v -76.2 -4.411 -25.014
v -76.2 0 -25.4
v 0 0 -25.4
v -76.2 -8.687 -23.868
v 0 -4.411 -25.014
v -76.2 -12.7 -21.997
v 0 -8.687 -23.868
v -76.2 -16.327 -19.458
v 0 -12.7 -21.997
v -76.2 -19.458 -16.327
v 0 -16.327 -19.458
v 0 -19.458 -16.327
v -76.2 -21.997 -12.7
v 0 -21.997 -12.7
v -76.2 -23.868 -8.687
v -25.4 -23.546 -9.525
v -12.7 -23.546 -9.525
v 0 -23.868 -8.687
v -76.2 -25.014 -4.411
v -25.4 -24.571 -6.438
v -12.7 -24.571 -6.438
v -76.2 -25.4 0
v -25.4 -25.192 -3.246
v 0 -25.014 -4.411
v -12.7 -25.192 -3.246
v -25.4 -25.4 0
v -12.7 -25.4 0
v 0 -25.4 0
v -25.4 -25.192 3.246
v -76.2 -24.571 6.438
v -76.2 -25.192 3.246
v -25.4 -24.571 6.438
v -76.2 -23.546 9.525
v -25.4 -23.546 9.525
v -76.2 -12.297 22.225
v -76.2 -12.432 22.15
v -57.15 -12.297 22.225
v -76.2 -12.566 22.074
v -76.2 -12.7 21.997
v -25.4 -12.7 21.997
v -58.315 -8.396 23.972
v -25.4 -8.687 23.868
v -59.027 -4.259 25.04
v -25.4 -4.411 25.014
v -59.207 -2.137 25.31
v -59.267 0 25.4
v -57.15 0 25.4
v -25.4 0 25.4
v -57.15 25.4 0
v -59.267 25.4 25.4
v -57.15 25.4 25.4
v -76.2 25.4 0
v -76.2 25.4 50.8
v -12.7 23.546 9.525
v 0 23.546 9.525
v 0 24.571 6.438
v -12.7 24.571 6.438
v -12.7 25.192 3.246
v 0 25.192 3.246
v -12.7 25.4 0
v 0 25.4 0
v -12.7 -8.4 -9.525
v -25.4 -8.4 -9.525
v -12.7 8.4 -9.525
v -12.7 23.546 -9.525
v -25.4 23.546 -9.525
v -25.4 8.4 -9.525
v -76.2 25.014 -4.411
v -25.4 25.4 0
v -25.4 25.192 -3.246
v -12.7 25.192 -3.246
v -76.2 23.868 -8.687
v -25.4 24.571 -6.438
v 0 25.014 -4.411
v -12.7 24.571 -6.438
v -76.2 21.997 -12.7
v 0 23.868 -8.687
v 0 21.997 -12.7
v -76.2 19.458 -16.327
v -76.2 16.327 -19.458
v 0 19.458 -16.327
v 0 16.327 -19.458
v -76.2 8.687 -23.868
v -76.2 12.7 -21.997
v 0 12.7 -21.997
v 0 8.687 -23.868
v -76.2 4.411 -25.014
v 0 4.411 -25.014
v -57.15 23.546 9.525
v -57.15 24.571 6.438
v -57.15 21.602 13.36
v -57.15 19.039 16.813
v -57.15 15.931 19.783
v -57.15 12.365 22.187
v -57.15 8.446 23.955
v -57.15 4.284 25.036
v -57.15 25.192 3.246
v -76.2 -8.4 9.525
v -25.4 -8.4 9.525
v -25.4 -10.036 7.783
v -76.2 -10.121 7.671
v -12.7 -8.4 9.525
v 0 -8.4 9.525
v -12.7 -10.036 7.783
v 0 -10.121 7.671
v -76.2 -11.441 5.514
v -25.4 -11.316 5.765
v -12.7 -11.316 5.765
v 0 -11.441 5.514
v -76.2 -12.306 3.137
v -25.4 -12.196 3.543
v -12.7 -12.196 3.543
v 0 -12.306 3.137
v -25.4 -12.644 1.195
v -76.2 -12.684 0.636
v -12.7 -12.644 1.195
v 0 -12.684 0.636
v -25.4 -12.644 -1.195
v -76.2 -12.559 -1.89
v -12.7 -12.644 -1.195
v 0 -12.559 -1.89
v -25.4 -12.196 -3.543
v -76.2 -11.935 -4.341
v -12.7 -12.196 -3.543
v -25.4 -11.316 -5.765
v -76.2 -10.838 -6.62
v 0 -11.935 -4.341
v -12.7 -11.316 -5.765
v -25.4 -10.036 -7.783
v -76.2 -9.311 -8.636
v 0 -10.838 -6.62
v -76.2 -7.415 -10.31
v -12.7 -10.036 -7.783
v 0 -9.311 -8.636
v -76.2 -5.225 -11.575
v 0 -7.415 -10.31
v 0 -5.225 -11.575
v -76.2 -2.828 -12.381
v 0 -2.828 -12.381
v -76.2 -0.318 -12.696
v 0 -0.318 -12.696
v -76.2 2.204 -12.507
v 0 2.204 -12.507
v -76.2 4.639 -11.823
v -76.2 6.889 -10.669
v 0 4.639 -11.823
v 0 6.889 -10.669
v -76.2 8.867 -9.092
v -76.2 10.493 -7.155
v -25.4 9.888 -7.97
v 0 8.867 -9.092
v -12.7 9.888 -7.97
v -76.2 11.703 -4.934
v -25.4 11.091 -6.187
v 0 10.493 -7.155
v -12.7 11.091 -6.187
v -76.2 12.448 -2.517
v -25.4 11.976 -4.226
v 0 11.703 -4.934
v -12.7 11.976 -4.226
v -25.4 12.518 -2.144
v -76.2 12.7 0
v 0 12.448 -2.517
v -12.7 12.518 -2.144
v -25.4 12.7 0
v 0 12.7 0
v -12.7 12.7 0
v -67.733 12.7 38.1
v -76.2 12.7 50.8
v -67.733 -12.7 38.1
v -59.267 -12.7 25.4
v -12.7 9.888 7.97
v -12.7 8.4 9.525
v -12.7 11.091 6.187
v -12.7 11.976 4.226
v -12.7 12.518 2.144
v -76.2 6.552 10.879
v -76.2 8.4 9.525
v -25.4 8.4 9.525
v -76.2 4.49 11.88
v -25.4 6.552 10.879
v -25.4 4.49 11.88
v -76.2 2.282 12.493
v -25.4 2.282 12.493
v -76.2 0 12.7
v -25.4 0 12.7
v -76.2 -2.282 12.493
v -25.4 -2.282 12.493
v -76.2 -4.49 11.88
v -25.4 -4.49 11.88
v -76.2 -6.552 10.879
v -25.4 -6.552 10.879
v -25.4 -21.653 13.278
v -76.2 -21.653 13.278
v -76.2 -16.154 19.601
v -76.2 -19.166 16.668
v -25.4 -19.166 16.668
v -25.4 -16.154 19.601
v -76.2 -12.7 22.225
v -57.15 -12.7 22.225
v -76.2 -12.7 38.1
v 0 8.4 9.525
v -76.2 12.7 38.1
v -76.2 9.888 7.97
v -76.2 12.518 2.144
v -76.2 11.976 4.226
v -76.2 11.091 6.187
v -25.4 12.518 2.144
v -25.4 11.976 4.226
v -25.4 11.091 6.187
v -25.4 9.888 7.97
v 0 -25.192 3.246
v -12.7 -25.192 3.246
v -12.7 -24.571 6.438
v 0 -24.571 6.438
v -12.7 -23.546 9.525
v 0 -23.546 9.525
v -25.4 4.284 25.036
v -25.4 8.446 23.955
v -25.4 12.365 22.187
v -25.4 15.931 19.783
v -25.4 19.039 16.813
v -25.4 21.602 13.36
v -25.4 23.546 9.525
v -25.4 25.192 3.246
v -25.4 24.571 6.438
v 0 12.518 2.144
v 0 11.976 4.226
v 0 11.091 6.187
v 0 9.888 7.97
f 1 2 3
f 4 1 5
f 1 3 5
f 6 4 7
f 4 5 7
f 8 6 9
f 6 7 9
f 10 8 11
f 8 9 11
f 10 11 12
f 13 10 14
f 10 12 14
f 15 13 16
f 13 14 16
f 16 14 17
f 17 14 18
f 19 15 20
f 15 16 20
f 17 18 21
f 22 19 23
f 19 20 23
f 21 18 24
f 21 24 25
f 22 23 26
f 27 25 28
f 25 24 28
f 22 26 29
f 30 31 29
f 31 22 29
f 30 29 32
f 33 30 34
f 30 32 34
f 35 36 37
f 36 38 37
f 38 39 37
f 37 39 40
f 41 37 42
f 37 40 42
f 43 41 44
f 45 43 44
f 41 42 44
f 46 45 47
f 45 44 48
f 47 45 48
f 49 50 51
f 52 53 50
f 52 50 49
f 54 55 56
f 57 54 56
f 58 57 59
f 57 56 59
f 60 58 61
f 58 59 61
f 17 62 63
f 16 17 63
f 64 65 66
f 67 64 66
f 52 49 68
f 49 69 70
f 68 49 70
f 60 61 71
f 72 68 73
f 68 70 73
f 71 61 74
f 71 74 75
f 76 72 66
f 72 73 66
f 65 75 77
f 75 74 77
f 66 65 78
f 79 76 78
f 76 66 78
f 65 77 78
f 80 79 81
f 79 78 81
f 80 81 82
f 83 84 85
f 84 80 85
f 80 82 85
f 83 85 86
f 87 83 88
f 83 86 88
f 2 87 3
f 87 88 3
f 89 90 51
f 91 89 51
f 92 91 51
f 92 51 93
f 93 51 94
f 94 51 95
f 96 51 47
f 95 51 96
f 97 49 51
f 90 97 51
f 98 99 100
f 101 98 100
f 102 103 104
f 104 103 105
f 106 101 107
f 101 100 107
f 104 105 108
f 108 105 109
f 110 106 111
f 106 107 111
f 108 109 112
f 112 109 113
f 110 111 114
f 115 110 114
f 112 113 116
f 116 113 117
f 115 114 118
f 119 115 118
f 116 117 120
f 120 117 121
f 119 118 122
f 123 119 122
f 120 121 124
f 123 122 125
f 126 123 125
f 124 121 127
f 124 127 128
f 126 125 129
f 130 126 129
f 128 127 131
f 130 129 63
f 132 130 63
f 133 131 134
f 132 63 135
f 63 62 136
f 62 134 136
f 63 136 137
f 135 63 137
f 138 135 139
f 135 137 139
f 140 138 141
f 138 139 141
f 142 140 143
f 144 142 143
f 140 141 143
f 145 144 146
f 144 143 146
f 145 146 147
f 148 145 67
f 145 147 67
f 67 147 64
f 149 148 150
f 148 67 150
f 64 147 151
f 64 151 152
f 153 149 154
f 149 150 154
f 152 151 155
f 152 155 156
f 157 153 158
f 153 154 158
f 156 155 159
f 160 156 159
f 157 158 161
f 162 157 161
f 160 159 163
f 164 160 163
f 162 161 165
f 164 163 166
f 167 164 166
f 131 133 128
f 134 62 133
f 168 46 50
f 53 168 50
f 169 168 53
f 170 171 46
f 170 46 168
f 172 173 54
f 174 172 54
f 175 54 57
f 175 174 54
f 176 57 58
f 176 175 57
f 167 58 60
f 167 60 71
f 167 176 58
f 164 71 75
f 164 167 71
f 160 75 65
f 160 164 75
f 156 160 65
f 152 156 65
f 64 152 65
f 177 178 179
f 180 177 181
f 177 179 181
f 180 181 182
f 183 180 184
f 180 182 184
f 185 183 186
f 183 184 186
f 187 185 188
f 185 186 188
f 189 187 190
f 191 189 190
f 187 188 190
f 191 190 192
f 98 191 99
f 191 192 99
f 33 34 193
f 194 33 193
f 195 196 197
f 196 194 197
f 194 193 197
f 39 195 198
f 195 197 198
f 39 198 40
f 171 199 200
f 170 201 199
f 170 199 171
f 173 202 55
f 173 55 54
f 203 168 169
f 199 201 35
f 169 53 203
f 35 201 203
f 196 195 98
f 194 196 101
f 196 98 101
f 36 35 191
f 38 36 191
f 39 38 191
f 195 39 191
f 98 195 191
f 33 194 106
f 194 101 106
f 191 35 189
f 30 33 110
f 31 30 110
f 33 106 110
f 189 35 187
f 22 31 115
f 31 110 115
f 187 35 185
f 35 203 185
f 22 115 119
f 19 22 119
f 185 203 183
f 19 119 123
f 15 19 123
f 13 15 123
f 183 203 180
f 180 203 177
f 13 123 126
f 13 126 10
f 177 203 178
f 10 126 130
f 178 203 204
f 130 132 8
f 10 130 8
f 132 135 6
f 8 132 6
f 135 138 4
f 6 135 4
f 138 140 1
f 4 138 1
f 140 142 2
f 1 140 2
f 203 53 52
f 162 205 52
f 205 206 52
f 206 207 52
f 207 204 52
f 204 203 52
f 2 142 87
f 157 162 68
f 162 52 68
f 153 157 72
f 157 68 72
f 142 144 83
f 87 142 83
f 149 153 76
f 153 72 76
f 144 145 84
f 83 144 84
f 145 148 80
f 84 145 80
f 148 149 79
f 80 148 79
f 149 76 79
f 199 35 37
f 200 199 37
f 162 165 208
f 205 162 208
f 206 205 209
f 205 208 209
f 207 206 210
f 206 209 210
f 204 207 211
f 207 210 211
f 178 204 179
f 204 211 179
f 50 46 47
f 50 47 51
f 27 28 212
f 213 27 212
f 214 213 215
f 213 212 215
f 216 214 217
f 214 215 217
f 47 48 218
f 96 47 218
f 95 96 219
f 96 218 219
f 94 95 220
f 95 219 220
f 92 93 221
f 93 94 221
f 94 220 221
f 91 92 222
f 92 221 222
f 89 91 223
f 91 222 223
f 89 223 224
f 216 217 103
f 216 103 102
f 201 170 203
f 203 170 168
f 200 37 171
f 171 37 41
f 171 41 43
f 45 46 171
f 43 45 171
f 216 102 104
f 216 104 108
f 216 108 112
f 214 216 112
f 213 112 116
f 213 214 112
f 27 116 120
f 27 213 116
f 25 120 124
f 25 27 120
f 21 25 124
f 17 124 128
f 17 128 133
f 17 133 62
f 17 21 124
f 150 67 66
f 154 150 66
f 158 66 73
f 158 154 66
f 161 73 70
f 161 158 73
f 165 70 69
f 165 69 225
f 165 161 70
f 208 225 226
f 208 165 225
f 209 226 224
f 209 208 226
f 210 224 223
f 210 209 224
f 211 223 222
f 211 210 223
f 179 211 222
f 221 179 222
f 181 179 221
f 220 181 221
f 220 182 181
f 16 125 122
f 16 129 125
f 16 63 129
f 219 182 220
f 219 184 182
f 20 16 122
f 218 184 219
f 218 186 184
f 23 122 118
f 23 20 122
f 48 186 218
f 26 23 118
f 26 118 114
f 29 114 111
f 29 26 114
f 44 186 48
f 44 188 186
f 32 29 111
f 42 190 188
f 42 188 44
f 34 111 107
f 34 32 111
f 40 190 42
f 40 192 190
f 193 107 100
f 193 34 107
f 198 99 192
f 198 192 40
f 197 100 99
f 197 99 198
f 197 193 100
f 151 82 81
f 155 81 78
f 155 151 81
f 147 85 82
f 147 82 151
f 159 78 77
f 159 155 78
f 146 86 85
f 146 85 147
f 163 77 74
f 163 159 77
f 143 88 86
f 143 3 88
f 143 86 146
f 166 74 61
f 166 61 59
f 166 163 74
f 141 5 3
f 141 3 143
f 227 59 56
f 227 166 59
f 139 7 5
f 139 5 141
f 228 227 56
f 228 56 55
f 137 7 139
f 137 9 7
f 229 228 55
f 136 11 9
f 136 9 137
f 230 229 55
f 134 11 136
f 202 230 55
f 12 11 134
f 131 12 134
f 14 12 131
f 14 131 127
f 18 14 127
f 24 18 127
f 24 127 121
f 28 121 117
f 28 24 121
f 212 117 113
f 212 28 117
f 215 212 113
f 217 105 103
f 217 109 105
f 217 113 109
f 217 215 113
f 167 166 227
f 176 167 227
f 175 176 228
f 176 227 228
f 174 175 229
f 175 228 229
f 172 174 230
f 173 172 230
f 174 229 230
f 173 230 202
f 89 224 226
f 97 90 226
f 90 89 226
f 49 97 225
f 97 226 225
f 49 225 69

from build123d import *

# Parameters (mm, degrees)
F2_DEPTH  = 25.4
F3_DEPTH  = 254
F4_DEPTH  = 105.41
F5_DEPTH  = 381
F6_DEPTH  = 127
F8_DEPTH  = 19.05
F9_DEPTH  = 12.7
F10_DEPTH = 254


with BuildPart() as f2:
    # F1 (on Front) → F2 (new body, symmetric)
    with BuildSketch(Plane.XZ):
        Polygon((0, -25.4), (0, 0), (0, 9.525), (-12.7, 9.525), (-12.7, -9.525), (-25.4, -9.525), (-25.4, 25.4), (-59.2666666667, 25.4), (-57.15, 22.225), (-76.2, 22.225), (-76.2, -25.4), align=None)
        Polygon((-76.2, 25.4), (-76.2, 22.225), (-57.15, 22.225), (-59.2666666667, 25.4), align=None)
        Polygon((-76.2, 50.8), (-76.2, 25.4), (-59.2666666667, 25.4), align=None)
    extrude(amount=F2_DEPTH, both=True)

    # F0 (on Right) → F3 (cut)
    with BuildSketch(Plane.YZ):
        with BuildLine():
            ThreePointArc((-8.4002604126, 9.525), (-5.2252604126, -11.5752604126), (12.7, 0))
            ThreePointArc((12.7, 0), (11.5752604126, 5.2252604126), (8.4002604126, 9.525))
            ThreePointArc((8.4002604126, 9.525), (0, 12.7), (-8.4002604126, 9.525))
        make_face()
    extrude(amount=-F3_DEPTH, mode=Mode.SUBTRACT)

    # F0 (on Right) → F4 (cut)
    with BuildSketch(Plane.YZ):
        with BuildLine():
            ThreePointArc((-12.7, 21.9970452561), (-6.5740037456, 24.5345159877), (0, 25.4))
            Line((0, 25.4), (-12.7, 25.4))
            Line((-12.7, 25.4), (-12.7, 21.9970452561))
        make_face()
        with BuildLine():
            ThreePointArc((-25.4, 0), (-24.9323016085, 4.8518384664), (-23.5464301965, 9.525))
            ThreePointArc((-23.5464301965, 9.525), (-19.1660873346, 16.6679661712), (-12.7, 21.9970452561))
            Line((-12.7, 21.9970452561), (-12.7, 25.4))
            Line((-12.7, 25.4), (-25.4, 25.4))
            Line((-25.4, 25.4), (-25.4, 0))
        make_face()
    extrude(amount=-F4_DEPTH, mode=Mode.SUBTRACT)

    # F0 (on Right) → F5 (cut)
    with BuildSketch(Plane.YZ):
        with BuildLine():
            ThreePointArc((0, 25.4), (14.1990316571, 21.0605674188), (23.5464301965, 9.525))
            ThreePointArc((23.5464301965, 9.525), (24.9323016085, 4.8518384664), (25.4, 0))
            Line((25.4, 0), (25.4, 25.4))
            Line((25.4, 25.4), (0, 25.4))
        make_face()
    extrude(amount=-F5_DEPTH, mode=Mode.SUBTRACT)

    # F0 (on Right) → F6 (cut)
    with BuildSketch(Plane.YZ):
        Polygon((-25.4, 25.4), (-12.7, 25.4), (-12.7, 38.1), (12.7, 38.1), (12.7, 50.8), (-25.4, 50.8), align=None)
    extrude(amount=-F6_DEPTH, mode=Mode.SUBTRACT)

    # F7 (on face) → F8 (join)
    with BuildSketch(Plane(origin=(-76.2, 0, 0), x_dir=(0, -1, 0), z_dir=(-1, 0, 0))):
        with BuildLine():
            Line((0, 25.4), (-25.4, 25.4))
            Line((-25.4, 25.4), (-25.4, 0))
            ThreePointArc((-25.4, 0), (-17.9605122421, 17.9605122421), (0, 25.4))
        make_face()
    extrude(amount=-F8_DEPTH)

    # F1 (on Front) → F9 (join)
    with BuildSketch(Plane.XZ):
        Polygon((-76.2, 25.4), (-76.2, 22.225), (-57.15, 22.225), (-59.2666666667, 25.4), align=None)
    extrude(amount=F9_DEPTH)

    # F0 (on Right) → F10 (cut)
    with BuildSketch(Plane.YZ):
        with BuildLine():
            ThreePointArc((0, -25.4), (-17.9605122421, -17.9605122421), (-25.4, 0))
            Line((-25.4, 0), (-25.4, -25.4))
            Line((-25.4, -25.4), (0, -25.4))
        make_face()
        with BuildLine():
            Line((25.4, -25.4), (25.4, 0))
            ThreePointArc((25.4, 0), (17.9605122421, -17.9605122421), (0, -25.4))
            Line((0, -25.4), (25.4, -25.4))
        make_face()
    extrude(amount=-F10_DEPTH, mode=Mode.SUBTRACT)


solid = f2.part
